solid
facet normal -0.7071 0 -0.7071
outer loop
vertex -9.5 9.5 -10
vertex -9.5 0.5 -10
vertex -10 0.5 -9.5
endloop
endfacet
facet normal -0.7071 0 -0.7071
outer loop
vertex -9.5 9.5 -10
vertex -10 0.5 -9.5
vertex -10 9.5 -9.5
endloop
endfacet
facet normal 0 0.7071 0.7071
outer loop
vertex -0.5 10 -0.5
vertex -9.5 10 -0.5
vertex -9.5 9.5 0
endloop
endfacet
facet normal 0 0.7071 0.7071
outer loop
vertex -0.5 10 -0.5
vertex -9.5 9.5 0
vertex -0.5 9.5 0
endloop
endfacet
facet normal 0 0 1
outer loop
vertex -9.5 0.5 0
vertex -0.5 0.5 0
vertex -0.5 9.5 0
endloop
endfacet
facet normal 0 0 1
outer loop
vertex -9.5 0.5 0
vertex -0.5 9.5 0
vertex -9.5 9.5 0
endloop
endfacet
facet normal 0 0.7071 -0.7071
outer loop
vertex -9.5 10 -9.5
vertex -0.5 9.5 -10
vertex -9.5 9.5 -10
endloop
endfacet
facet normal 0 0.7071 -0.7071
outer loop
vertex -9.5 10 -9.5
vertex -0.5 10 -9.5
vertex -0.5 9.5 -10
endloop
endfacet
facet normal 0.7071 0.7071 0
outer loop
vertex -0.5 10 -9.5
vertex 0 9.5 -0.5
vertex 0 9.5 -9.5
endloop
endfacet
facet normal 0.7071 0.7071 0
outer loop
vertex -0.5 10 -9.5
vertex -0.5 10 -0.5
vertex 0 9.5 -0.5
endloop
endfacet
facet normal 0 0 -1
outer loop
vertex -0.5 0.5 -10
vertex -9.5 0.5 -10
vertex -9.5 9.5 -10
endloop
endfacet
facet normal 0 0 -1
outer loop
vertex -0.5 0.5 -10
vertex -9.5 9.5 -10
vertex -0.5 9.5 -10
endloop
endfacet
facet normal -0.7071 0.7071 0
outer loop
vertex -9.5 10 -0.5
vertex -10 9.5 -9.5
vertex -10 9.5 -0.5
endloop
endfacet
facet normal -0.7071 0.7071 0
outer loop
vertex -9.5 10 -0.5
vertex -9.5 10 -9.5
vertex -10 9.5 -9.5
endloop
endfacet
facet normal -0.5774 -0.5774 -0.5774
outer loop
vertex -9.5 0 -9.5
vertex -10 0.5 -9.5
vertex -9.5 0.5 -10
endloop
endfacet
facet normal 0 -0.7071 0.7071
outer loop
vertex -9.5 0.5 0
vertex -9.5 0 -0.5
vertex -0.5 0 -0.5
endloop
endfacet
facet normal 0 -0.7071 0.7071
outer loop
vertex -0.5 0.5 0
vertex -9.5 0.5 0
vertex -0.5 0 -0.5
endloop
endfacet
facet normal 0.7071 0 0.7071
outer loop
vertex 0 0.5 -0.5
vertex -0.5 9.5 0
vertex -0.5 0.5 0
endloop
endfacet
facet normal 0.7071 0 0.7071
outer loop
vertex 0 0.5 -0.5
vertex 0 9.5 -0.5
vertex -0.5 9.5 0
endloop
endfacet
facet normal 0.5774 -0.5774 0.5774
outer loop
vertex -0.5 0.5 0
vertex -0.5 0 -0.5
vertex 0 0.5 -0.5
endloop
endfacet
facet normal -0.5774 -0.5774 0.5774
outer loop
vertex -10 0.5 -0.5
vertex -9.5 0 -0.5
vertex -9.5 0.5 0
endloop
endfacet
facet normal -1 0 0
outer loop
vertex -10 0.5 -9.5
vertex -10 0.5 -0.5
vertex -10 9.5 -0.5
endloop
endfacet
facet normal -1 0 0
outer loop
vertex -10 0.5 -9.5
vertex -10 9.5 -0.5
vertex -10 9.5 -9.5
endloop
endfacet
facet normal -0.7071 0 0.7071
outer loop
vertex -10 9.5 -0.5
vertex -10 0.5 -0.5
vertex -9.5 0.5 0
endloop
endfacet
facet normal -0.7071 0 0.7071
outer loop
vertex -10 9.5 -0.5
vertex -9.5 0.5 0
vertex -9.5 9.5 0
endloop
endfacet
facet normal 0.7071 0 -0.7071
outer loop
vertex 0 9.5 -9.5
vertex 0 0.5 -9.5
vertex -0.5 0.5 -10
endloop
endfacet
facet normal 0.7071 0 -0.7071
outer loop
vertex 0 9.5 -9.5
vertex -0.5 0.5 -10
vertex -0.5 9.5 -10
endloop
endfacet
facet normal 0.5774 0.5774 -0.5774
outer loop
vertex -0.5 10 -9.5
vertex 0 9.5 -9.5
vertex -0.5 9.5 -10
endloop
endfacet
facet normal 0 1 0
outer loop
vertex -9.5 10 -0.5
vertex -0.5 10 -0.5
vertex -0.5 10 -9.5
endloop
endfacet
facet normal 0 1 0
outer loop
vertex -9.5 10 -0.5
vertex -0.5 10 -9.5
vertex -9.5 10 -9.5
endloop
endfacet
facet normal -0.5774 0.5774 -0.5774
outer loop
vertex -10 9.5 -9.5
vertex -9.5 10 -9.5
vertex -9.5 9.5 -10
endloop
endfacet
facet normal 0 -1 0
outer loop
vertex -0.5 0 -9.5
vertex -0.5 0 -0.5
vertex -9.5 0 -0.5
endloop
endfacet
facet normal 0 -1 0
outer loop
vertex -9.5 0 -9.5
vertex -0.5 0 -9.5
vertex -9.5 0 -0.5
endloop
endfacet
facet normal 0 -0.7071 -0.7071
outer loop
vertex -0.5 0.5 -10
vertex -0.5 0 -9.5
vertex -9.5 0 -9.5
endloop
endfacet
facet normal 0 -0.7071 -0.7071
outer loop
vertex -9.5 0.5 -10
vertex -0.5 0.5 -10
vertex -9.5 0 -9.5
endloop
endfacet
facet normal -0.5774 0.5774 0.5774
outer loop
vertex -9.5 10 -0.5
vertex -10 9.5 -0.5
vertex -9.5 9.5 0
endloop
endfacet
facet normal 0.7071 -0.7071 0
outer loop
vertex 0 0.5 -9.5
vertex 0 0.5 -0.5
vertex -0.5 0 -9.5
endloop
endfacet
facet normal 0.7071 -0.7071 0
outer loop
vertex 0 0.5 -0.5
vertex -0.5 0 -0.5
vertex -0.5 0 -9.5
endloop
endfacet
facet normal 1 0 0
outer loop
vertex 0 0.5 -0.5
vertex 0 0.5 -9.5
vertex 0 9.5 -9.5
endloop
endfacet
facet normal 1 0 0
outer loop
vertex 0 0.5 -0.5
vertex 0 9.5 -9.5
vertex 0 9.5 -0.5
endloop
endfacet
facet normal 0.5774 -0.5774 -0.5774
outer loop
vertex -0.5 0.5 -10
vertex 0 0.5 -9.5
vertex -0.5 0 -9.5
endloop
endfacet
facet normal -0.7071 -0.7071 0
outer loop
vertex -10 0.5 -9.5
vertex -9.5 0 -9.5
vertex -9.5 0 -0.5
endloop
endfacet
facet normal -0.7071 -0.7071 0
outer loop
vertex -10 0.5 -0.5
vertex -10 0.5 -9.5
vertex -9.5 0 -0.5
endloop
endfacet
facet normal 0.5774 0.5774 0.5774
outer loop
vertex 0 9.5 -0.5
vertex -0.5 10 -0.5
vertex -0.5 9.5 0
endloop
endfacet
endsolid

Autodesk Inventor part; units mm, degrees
ref_plane "YZ Plane" through (0, 0, 0) normal (1, 0, 0) x (0, 1, 0)
ref_plane "XZ Plane" through (0, 0, 0) normal (0, 1, 0) x (-1, 0, 0)
ref_plane "XY Plane" through (0, 0, 0) normal (0, 0, 1) x (1, 0, 0)
sketch "Sketch1" plane through (0, 0, 0) normal (0, 1, 0) x (-1, 0, 0)
  line L0 (0, 0) -> (10, 0)
  line L1 (10, 0) -> (10, -10)
  line L2 (10, -10) -> (0, -10)
  line L3 (0, -10) -> (0, 0)
  dimension "d0" = 10
  dimension "d1" = 10
extrude "Extrusion1" add sketch "Sketch1" along normal blind 10
chamfer "Chamfer1" distance 0.5 angle 45 12 edges at (-10, 10, -5) (-10, 0, -5) (-5, 0, 0) (0, 10, -5) (0, 0, -5) (0, 5, -10) (-5, 10, -10) (-10, 5, -10) (-5, 0, -10) (-10, 5, 0) (-5, 10, 0) (0, 5, 0)
properties part number "cube"
